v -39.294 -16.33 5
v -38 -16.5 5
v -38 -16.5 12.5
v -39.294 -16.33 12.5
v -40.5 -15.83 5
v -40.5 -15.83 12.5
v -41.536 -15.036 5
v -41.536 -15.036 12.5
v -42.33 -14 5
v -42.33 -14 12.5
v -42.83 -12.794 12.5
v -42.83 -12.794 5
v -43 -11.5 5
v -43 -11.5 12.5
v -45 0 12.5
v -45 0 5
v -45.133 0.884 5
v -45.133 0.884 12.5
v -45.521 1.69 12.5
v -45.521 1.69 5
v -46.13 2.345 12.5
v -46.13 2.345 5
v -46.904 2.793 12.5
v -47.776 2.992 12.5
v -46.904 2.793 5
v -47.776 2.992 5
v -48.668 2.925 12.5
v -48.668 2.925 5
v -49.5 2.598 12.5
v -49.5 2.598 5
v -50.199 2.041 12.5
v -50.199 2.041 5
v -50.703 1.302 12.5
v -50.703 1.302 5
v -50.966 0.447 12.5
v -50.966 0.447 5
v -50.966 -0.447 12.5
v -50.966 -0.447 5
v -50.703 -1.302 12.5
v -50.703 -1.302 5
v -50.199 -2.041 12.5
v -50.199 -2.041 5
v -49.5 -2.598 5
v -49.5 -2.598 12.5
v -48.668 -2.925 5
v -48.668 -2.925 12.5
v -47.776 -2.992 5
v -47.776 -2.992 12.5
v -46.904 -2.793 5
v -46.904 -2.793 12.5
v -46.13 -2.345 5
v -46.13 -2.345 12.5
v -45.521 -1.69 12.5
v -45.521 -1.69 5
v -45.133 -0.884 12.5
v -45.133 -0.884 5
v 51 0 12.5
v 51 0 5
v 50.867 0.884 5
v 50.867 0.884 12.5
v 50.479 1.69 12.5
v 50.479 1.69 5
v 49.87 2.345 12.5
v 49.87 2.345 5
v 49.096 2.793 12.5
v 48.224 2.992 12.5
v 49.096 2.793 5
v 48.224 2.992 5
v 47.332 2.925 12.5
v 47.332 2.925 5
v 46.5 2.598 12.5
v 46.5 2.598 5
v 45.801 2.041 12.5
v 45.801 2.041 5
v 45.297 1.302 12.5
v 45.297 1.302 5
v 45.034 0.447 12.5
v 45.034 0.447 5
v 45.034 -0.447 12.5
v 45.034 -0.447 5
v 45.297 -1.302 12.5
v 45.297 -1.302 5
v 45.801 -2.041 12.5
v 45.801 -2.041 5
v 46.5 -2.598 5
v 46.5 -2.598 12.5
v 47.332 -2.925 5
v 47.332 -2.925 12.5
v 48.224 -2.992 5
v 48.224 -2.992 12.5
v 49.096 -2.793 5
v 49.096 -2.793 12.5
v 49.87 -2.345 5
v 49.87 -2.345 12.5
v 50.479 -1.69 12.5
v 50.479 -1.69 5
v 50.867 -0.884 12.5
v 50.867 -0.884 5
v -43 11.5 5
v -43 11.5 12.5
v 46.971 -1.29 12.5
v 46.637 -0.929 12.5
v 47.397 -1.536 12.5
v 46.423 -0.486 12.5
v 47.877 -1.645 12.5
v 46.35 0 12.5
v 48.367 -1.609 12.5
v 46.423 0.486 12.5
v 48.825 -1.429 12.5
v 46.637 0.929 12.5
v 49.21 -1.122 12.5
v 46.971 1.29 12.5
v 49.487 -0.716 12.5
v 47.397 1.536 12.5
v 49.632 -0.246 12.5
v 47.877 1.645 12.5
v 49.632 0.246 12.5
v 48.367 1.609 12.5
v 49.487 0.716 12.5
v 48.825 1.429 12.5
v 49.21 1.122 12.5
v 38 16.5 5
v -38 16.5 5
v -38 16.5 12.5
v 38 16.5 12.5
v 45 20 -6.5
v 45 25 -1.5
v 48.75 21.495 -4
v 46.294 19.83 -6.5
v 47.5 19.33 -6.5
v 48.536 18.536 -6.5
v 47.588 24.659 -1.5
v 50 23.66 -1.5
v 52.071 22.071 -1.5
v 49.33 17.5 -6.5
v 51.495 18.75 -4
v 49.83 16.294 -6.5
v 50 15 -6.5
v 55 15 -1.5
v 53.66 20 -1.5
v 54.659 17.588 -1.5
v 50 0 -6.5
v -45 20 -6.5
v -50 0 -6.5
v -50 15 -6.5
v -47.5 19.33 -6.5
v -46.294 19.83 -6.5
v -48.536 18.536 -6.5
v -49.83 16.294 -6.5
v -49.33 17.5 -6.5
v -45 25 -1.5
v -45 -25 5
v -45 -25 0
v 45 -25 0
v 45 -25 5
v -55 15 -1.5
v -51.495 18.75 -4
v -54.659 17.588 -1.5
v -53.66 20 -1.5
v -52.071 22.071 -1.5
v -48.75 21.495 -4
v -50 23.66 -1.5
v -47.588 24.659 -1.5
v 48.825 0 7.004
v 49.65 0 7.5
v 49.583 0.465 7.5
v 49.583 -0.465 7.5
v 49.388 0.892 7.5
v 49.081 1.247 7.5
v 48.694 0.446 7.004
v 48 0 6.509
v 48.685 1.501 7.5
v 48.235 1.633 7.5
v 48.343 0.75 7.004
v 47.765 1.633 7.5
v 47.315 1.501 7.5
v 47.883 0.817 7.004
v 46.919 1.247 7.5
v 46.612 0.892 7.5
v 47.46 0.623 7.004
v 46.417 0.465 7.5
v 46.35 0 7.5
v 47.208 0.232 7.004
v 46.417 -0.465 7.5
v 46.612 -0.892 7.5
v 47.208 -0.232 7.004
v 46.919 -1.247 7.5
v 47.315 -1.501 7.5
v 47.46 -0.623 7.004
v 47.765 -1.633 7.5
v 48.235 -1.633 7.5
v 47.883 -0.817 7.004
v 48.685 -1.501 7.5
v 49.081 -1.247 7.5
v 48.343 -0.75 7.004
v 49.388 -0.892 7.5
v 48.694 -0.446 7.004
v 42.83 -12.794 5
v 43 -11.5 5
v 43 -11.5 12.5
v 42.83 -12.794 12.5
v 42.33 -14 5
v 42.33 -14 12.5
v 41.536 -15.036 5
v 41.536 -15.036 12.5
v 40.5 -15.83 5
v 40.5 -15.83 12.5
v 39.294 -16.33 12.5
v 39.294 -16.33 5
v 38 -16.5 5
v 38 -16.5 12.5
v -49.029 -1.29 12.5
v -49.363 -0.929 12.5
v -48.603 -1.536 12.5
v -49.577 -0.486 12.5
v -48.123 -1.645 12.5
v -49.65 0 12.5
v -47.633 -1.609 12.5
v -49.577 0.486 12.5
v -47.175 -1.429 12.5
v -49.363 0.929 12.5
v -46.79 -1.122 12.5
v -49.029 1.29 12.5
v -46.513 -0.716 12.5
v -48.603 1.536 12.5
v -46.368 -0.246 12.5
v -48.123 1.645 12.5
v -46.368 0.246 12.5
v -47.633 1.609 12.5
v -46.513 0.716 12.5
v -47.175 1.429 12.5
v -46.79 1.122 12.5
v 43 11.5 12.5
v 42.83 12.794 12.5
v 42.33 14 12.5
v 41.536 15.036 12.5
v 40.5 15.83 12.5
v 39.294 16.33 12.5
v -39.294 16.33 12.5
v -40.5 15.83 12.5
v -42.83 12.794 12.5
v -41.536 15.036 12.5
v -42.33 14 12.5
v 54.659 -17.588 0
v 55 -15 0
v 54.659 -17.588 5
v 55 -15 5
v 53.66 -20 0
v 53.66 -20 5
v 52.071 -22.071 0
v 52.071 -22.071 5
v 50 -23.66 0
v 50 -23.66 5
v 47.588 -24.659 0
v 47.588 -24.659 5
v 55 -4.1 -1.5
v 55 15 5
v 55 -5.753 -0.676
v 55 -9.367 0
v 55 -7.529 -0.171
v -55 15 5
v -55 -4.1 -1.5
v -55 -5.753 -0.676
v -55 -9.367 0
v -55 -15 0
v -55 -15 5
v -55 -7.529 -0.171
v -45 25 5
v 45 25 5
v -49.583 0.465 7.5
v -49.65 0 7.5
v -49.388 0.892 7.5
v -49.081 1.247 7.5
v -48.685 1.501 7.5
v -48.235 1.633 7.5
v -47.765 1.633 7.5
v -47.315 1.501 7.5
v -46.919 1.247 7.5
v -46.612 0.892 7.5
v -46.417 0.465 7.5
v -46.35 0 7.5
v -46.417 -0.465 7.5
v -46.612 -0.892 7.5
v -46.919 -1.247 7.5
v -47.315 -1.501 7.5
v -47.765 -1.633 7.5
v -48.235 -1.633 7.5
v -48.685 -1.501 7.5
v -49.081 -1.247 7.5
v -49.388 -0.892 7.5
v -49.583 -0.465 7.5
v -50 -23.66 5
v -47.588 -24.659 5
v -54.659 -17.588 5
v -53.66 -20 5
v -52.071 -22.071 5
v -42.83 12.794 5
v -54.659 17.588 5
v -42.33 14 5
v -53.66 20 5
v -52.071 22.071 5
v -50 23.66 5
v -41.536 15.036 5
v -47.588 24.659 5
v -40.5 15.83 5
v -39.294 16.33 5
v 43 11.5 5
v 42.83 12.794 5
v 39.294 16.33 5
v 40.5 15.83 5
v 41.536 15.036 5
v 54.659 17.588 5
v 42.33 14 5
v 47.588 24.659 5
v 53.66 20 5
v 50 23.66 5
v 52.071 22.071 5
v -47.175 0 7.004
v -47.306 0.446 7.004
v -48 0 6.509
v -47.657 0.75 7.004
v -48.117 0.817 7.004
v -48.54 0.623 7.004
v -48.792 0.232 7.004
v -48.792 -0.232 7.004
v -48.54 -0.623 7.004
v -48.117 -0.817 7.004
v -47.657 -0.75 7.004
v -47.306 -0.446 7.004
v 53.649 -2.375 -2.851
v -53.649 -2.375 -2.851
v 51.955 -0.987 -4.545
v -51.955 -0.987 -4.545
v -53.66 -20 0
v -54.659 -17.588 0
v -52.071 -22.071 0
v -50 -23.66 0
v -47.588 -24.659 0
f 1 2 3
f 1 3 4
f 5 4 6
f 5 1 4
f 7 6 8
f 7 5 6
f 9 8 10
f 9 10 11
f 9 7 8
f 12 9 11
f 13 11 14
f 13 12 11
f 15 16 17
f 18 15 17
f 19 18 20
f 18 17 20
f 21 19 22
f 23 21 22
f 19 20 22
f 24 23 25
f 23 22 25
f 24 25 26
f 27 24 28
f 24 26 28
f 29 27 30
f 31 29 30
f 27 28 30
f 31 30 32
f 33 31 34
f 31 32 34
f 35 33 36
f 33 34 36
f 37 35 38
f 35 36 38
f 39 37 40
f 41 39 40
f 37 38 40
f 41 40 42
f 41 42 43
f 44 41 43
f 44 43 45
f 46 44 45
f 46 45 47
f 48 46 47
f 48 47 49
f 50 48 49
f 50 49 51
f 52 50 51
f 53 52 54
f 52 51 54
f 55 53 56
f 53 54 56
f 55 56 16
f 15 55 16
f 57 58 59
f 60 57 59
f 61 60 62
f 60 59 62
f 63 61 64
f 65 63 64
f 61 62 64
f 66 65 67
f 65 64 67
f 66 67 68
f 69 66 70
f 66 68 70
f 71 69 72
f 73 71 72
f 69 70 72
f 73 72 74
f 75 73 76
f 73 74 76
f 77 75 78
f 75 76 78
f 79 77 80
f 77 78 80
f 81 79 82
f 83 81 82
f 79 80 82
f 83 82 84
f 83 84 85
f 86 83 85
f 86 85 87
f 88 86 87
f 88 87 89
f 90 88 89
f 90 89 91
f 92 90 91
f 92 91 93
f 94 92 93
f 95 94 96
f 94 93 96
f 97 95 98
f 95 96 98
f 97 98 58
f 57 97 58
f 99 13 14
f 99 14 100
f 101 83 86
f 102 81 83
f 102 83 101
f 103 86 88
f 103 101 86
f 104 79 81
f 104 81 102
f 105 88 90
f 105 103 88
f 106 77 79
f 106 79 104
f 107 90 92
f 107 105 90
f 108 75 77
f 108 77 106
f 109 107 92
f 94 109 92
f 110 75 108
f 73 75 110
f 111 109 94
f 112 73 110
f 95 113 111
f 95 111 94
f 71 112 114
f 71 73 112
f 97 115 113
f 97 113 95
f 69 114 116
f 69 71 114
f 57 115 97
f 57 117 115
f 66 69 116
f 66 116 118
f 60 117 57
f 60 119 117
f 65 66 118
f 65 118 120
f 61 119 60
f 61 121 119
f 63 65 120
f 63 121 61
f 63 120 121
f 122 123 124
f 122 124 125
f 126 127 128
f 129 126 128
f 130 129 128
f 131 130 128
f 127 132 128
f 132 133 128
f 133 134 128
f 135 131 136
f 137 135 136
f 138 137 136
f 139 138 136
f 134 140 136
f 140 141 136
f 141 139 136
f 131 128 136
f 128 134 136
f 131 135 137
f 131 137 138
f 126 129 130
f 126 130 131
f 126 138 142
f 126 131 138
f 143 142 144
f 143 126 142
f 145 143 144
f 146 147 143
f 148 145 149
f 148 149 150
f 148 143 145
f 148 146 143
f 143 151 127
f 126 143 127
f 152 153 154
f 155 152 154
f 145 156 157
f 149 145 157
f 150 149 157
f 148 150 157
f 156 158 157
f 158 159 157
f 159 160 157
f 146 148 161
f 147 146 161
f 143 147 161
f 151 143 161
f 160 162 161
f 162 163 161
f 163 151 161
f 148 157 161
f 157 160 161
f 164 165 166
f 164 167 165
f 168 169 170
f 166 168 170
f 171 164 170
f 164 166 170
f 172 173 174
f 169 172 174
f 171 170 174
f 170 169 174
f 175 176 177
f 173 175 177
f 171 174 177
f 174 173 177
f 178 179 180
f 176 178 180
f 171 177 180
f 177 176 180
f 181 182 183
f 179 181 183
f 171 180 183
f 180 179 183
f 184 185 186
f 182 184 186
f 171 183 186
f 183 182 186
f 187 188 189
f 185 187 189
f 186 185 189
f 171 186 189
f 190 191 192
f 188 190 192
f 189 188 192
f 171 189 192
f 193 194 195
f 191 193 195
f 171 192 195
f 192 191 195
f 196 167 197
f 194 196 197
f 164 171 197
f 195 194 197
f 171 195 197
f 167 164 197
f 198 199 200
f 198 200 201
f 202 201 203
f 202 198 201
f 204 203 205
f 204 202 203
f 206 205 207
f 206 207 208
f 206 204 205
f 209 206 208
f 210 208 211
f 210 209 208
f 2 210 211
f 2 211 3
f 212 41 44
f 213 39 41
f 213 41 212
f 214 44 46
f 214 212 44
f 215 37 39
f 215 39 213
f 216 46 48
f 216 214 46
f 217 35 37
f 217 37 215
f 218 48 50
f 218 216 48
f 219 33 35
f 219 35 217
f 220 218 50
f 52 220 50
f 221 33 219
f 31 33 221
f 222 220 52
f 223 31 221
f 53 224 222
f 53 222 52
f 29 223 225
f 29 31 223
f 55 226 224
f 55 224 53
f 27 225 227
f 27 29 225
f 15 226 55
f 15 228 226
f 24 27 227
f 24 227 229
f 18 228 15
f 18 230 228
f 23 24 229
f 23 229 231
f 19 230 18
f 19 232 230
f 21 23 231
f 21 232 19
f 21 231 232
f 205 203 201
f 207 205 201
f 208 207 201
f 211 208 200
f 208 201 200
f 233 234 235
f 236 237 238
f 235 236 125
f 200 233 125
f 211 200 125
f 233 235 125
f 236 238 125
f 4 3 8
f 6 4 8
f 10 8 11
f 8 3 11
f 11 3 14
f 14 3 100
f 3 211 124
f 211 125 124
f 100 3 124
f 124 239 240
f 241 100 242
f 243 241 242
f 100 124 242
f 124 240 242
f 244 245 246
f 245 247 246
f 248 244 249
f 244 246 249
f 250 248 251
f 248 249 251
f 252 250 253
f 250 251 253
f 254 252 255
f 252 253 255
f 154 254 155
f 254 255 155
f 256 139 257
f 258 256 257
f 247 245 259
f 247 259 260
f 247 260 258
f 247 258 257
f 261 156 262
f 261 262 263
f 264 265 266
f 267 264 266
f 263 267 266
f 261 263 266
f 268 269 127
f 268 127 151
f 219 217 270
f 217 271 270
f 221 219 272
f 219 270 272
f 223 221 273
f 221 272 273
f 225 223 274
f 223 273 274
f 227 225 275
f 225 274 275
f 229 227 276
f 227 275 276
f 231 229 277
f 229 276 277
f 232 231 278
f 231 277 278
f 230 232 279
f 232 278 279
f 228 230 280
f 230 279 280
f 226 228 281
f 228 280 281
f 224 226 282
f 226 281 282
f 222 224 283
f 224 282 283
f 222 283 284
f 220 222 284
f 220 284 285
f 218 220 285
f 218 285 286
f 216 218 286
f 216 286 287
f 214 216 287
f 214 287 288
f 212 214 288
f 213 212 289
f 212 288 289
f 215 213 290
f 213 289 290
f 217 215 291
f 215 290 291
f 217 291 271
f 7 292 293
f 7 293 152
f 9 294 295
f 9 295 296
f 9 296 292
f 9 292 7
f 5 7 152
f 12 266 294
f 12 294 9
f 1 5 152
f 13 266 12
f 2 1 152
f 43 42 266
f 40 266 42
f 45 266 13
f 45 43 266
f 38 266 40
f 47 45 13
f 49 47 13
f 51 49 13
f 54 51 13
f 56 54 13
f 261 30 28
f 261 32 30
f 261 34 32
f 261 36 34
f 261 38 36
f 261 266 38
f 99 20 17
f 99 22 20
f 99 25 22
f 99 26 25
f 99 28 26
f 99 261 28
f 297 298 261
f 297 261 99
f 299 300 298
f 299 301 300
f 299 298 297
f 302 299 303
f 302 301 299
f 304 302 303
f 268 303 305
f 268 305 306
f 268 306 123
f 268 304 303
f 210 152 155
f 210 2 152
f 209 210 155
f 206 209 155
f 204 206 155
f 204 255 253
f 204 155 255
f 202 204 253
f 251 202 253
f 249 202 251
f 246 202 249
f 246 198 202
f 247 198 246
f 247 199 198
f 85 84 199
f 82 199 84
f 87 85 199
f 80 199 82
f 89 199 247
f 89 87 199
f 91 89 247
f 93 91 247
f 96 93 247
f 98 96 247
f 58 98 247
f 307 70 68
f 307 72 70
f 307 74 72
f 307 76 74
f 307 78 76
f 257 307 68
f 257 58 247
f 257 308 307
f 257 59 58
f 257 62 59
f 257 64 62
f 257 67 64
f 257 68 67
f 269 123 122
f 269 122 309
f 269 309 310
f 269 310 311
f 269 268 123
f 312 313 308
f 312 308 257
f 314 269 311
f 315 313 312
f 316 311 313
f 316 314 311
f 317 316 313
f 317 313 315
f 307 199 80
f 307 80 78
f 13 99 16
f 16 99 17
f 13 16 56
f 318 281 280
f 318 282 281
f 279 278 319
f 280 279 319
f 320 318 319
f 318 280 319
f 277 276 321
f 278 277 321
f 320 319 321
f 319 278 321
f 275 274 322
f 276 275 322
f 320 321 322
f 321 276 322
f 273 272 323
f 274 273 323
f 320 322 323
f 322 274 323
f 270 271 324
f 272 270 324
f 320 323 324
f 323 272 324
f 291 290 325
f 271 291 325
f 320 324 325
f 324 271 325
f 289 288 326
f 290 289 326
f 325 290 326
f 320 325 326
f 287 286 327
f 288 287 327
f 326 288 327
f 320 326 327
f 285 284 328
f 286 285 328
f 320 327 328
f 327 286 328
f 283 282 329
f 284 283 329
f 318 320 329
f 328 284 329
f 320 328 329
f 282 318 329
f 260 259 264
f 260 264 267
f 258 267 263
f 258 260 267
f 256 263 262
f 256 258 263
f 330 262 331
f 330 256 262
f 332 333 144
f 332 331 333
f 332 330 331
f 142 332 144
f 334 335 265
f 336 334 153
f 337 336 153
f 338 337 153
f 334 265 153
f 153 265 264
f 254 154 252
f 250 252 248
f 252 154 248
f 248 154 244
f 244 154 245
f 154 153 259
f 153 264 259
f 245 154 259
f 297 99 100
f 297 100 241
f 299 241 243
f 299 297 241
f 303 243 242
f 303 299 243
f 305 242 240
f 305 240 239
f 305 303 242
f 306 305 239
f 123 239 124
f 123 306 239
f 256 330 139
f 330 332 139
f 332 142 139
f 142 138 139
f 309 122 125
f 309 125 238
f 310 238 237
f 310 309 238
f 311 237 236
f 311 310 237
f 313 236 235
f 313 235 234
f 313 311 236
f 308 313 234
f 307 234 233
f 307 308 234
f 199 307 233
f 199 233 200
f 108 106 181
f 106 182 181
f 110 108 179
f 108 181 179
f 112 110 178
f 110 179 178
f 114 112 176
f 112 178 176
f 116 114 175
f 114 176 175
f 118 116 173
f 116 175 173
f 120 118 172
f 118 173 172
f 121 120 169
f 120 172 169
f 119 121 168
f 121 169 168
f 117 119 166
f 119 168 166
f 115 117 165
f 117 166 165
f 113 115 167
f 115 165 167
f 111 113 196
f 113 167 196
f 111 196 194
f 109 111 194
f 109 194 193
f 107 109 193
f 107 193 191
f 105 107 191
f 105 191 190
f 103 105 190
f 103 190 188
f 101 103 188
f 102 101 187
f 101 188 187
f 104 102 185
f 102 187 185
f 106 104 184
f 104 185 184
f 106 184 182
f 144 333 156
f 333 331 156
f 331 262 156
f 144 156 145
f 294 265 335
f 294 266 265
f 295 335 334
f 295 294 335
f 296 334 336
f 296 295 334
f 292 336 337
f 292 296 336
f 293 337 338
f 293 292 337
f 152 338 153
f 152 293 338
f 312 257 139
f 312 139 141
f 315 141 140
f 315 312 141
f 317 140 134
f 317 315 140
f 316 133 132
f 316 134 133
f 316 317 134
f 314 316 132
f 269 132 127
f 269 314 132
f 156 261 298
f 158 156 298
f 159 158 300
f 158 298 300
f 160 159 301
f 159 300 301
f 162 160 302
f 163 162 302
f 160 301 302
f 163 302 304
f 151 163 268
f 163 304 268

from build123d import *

# Parameters (mm, degrees)
SKETCH_1_W             = 110
SKETCH_1_H             = 50
EXTRUDE_1_DEPTH        = 5
SKETCH_2_R             = 3
EXTRUDE_2_DEPTH        = 7.5
HOLE_WIZARD_M4_1_D     = 3.3
HOLE_WIZARD_M4_1_DEPTH = 5
HOLE_WIZARD_M4_1_TIP   = 0.991420021
SKETCH_6_W             = 110
SKETCH_6_H             = 25
EXTRUDE_3_DEPTH        = 6.5
FILLET_1_R             = 10
CHAMFER_1_SIZE         = 5
FILLET_2_R             = 10


with BuildPart() as part:
    # 草图1 → 凸台-拉伸1 (new body)
    with BuildSketch(Plane.XY):
        Rectangle(SKETCH_1_W, SKETCH_1_H)
    extrude(amount=EXTRUDE_1_DEPTH)

    # 草图2 → 凸台-拉伸2 (add)
    with BuildSketch(Plane.XY.offset(5)):
        with Locations((-48, 0)):
            Circle(SKETCH_2_R)
        with Locations((48, 0)):
            Circle(SKETCH_2_R)
        with BuildLine():
            Line((-38, 16.5), (38, 16.5))
            ThreePointArc((38, 16.5), (41.535533906, 15.035533906), (43, 11.5))
            Line((43, 11.5), (43, -11.5))
            ThreePointArc((43, -11.5), (41.535533906, -15.035533906), (38, -16.5))
            Line((38, -16.5), (-38, -16.5))
            ThreePointArc((-38, -16.5), (-41.535533906, -15.035533906), (-43, -11.5))
            Line((-43, -11.5), (-43, 11.5))
            ThreePointArc((-43, 11.5), (-41.535533906, 15.035533906), (-38, 16.5))
        make_face()
    extrude(amount=EXTRUDE_2_DEPTH)

    # M4 螺纹孔1
    with Locations(Plane.XY.offset(12.5)):
        with Locations((48, 0), (-48, 0)):
            Hole(HOLE_WIZARD_M4_1_D / 2, depth=HOLE_WIZARD_M4_1_DEPTH)
            with Locations((0, 0, -(HOLE_WIZARD_M4_1_DEPTH + HOLE_WIZARD_M4_1_TIP / 2))):  # 118° drill point
                Cone(0, HOLE_WIZARD_M4_1_D / 2, HOLE_WIZARD_M4_1_TIP, mode=Mode.SUBTRACT)

    # 草图6 → 凸台-拉伸3 (add)
    with BuildSketch(Plane(origin=(0, 0, 0), x_dir=(-1, 0, 0), z_dir=(0, 0, -1))):
        with Locations((0, 12.5)):
            Rectangle(SKETCH_6_W, SKETCH_6_H)
    extrude(amount=EXTRUDE_3_DEPTH)

    # 圆角1
    fillet_1_edges = [part.edges().sort_by_distance(p)[0] for p in [
        (55, -25, 2.5),
        (-55, -25, 2.5),
        (-55, 25, -0.75),
        (55, 25, -0.75),
    ]]
    fillet(fillet_1_edges, radius=FILLET_1_R)

    # 倒角1
    chamfer_1_edges = [part.edges().sort_by_distance(p)[0] for p in [
        (-55, 7.5, -6.5),
        (0, 25, -6.5),
        (55, 7.5, -6.5),
        (-52.071067812, 22.071067812, -6.5),
        (52.071067812, 22.071067812, -6.5),
    ]]
    chamfer(chamfer_1_edges, length=CHAMFER_1_SIZE)

    # 圆角2
    # the kernel refuses this fillet: 10 mm, written as the material it adds along each edge
    with BuildSketch(Plane(origin=(55, 0, 0), x_dir=(0, 0, -1), z_dir=(-1, 0, 0))) as fillet_2_piece_1_section:
        with BuildLine():
            CenterArc((10, 9.367496998), FILLET_2_R, 180, 69.512684885)
            Line((0, 9.367496998), (-0.2, 9.367496998))
            Line((-0.2, 9.367496998), (-0.2, 0))
            Line((-0.2, 0), (0, -0.2))
            ThreePointArc((0, -0.2), (3.25, -0.2), (6.43, -0.18734994))
            Line((6.43, -0.18734994), (6.5, 0))
        make_face()
    fillet_2_piece_1 = extrude(amount=110, mode=Mode.PRIVATE)
    fillet_2_piece_1 = split(fillet_2_piece_1, bisect_by=Plane(origin=(-27.428646518, -2.275588703, -29.071353482), z_dir=(0.7071067811865476, 0, 0.7071067811865476)), keep=Keep.TOP, mode=Mode.PRIVATE)
    fillet_2_piece_1 = split(fillet_2_piece_1, bisect_by=Plane(origin=(27.428646518, -2.275588703, -29.071353482), z_dir=(-0.7071067811865476, 0, 0.7071067811865476)), keep=Keep.TOP, mode=Mode.PRIVATE)
    add(fillet_2_piece_1)


solid = part.part
